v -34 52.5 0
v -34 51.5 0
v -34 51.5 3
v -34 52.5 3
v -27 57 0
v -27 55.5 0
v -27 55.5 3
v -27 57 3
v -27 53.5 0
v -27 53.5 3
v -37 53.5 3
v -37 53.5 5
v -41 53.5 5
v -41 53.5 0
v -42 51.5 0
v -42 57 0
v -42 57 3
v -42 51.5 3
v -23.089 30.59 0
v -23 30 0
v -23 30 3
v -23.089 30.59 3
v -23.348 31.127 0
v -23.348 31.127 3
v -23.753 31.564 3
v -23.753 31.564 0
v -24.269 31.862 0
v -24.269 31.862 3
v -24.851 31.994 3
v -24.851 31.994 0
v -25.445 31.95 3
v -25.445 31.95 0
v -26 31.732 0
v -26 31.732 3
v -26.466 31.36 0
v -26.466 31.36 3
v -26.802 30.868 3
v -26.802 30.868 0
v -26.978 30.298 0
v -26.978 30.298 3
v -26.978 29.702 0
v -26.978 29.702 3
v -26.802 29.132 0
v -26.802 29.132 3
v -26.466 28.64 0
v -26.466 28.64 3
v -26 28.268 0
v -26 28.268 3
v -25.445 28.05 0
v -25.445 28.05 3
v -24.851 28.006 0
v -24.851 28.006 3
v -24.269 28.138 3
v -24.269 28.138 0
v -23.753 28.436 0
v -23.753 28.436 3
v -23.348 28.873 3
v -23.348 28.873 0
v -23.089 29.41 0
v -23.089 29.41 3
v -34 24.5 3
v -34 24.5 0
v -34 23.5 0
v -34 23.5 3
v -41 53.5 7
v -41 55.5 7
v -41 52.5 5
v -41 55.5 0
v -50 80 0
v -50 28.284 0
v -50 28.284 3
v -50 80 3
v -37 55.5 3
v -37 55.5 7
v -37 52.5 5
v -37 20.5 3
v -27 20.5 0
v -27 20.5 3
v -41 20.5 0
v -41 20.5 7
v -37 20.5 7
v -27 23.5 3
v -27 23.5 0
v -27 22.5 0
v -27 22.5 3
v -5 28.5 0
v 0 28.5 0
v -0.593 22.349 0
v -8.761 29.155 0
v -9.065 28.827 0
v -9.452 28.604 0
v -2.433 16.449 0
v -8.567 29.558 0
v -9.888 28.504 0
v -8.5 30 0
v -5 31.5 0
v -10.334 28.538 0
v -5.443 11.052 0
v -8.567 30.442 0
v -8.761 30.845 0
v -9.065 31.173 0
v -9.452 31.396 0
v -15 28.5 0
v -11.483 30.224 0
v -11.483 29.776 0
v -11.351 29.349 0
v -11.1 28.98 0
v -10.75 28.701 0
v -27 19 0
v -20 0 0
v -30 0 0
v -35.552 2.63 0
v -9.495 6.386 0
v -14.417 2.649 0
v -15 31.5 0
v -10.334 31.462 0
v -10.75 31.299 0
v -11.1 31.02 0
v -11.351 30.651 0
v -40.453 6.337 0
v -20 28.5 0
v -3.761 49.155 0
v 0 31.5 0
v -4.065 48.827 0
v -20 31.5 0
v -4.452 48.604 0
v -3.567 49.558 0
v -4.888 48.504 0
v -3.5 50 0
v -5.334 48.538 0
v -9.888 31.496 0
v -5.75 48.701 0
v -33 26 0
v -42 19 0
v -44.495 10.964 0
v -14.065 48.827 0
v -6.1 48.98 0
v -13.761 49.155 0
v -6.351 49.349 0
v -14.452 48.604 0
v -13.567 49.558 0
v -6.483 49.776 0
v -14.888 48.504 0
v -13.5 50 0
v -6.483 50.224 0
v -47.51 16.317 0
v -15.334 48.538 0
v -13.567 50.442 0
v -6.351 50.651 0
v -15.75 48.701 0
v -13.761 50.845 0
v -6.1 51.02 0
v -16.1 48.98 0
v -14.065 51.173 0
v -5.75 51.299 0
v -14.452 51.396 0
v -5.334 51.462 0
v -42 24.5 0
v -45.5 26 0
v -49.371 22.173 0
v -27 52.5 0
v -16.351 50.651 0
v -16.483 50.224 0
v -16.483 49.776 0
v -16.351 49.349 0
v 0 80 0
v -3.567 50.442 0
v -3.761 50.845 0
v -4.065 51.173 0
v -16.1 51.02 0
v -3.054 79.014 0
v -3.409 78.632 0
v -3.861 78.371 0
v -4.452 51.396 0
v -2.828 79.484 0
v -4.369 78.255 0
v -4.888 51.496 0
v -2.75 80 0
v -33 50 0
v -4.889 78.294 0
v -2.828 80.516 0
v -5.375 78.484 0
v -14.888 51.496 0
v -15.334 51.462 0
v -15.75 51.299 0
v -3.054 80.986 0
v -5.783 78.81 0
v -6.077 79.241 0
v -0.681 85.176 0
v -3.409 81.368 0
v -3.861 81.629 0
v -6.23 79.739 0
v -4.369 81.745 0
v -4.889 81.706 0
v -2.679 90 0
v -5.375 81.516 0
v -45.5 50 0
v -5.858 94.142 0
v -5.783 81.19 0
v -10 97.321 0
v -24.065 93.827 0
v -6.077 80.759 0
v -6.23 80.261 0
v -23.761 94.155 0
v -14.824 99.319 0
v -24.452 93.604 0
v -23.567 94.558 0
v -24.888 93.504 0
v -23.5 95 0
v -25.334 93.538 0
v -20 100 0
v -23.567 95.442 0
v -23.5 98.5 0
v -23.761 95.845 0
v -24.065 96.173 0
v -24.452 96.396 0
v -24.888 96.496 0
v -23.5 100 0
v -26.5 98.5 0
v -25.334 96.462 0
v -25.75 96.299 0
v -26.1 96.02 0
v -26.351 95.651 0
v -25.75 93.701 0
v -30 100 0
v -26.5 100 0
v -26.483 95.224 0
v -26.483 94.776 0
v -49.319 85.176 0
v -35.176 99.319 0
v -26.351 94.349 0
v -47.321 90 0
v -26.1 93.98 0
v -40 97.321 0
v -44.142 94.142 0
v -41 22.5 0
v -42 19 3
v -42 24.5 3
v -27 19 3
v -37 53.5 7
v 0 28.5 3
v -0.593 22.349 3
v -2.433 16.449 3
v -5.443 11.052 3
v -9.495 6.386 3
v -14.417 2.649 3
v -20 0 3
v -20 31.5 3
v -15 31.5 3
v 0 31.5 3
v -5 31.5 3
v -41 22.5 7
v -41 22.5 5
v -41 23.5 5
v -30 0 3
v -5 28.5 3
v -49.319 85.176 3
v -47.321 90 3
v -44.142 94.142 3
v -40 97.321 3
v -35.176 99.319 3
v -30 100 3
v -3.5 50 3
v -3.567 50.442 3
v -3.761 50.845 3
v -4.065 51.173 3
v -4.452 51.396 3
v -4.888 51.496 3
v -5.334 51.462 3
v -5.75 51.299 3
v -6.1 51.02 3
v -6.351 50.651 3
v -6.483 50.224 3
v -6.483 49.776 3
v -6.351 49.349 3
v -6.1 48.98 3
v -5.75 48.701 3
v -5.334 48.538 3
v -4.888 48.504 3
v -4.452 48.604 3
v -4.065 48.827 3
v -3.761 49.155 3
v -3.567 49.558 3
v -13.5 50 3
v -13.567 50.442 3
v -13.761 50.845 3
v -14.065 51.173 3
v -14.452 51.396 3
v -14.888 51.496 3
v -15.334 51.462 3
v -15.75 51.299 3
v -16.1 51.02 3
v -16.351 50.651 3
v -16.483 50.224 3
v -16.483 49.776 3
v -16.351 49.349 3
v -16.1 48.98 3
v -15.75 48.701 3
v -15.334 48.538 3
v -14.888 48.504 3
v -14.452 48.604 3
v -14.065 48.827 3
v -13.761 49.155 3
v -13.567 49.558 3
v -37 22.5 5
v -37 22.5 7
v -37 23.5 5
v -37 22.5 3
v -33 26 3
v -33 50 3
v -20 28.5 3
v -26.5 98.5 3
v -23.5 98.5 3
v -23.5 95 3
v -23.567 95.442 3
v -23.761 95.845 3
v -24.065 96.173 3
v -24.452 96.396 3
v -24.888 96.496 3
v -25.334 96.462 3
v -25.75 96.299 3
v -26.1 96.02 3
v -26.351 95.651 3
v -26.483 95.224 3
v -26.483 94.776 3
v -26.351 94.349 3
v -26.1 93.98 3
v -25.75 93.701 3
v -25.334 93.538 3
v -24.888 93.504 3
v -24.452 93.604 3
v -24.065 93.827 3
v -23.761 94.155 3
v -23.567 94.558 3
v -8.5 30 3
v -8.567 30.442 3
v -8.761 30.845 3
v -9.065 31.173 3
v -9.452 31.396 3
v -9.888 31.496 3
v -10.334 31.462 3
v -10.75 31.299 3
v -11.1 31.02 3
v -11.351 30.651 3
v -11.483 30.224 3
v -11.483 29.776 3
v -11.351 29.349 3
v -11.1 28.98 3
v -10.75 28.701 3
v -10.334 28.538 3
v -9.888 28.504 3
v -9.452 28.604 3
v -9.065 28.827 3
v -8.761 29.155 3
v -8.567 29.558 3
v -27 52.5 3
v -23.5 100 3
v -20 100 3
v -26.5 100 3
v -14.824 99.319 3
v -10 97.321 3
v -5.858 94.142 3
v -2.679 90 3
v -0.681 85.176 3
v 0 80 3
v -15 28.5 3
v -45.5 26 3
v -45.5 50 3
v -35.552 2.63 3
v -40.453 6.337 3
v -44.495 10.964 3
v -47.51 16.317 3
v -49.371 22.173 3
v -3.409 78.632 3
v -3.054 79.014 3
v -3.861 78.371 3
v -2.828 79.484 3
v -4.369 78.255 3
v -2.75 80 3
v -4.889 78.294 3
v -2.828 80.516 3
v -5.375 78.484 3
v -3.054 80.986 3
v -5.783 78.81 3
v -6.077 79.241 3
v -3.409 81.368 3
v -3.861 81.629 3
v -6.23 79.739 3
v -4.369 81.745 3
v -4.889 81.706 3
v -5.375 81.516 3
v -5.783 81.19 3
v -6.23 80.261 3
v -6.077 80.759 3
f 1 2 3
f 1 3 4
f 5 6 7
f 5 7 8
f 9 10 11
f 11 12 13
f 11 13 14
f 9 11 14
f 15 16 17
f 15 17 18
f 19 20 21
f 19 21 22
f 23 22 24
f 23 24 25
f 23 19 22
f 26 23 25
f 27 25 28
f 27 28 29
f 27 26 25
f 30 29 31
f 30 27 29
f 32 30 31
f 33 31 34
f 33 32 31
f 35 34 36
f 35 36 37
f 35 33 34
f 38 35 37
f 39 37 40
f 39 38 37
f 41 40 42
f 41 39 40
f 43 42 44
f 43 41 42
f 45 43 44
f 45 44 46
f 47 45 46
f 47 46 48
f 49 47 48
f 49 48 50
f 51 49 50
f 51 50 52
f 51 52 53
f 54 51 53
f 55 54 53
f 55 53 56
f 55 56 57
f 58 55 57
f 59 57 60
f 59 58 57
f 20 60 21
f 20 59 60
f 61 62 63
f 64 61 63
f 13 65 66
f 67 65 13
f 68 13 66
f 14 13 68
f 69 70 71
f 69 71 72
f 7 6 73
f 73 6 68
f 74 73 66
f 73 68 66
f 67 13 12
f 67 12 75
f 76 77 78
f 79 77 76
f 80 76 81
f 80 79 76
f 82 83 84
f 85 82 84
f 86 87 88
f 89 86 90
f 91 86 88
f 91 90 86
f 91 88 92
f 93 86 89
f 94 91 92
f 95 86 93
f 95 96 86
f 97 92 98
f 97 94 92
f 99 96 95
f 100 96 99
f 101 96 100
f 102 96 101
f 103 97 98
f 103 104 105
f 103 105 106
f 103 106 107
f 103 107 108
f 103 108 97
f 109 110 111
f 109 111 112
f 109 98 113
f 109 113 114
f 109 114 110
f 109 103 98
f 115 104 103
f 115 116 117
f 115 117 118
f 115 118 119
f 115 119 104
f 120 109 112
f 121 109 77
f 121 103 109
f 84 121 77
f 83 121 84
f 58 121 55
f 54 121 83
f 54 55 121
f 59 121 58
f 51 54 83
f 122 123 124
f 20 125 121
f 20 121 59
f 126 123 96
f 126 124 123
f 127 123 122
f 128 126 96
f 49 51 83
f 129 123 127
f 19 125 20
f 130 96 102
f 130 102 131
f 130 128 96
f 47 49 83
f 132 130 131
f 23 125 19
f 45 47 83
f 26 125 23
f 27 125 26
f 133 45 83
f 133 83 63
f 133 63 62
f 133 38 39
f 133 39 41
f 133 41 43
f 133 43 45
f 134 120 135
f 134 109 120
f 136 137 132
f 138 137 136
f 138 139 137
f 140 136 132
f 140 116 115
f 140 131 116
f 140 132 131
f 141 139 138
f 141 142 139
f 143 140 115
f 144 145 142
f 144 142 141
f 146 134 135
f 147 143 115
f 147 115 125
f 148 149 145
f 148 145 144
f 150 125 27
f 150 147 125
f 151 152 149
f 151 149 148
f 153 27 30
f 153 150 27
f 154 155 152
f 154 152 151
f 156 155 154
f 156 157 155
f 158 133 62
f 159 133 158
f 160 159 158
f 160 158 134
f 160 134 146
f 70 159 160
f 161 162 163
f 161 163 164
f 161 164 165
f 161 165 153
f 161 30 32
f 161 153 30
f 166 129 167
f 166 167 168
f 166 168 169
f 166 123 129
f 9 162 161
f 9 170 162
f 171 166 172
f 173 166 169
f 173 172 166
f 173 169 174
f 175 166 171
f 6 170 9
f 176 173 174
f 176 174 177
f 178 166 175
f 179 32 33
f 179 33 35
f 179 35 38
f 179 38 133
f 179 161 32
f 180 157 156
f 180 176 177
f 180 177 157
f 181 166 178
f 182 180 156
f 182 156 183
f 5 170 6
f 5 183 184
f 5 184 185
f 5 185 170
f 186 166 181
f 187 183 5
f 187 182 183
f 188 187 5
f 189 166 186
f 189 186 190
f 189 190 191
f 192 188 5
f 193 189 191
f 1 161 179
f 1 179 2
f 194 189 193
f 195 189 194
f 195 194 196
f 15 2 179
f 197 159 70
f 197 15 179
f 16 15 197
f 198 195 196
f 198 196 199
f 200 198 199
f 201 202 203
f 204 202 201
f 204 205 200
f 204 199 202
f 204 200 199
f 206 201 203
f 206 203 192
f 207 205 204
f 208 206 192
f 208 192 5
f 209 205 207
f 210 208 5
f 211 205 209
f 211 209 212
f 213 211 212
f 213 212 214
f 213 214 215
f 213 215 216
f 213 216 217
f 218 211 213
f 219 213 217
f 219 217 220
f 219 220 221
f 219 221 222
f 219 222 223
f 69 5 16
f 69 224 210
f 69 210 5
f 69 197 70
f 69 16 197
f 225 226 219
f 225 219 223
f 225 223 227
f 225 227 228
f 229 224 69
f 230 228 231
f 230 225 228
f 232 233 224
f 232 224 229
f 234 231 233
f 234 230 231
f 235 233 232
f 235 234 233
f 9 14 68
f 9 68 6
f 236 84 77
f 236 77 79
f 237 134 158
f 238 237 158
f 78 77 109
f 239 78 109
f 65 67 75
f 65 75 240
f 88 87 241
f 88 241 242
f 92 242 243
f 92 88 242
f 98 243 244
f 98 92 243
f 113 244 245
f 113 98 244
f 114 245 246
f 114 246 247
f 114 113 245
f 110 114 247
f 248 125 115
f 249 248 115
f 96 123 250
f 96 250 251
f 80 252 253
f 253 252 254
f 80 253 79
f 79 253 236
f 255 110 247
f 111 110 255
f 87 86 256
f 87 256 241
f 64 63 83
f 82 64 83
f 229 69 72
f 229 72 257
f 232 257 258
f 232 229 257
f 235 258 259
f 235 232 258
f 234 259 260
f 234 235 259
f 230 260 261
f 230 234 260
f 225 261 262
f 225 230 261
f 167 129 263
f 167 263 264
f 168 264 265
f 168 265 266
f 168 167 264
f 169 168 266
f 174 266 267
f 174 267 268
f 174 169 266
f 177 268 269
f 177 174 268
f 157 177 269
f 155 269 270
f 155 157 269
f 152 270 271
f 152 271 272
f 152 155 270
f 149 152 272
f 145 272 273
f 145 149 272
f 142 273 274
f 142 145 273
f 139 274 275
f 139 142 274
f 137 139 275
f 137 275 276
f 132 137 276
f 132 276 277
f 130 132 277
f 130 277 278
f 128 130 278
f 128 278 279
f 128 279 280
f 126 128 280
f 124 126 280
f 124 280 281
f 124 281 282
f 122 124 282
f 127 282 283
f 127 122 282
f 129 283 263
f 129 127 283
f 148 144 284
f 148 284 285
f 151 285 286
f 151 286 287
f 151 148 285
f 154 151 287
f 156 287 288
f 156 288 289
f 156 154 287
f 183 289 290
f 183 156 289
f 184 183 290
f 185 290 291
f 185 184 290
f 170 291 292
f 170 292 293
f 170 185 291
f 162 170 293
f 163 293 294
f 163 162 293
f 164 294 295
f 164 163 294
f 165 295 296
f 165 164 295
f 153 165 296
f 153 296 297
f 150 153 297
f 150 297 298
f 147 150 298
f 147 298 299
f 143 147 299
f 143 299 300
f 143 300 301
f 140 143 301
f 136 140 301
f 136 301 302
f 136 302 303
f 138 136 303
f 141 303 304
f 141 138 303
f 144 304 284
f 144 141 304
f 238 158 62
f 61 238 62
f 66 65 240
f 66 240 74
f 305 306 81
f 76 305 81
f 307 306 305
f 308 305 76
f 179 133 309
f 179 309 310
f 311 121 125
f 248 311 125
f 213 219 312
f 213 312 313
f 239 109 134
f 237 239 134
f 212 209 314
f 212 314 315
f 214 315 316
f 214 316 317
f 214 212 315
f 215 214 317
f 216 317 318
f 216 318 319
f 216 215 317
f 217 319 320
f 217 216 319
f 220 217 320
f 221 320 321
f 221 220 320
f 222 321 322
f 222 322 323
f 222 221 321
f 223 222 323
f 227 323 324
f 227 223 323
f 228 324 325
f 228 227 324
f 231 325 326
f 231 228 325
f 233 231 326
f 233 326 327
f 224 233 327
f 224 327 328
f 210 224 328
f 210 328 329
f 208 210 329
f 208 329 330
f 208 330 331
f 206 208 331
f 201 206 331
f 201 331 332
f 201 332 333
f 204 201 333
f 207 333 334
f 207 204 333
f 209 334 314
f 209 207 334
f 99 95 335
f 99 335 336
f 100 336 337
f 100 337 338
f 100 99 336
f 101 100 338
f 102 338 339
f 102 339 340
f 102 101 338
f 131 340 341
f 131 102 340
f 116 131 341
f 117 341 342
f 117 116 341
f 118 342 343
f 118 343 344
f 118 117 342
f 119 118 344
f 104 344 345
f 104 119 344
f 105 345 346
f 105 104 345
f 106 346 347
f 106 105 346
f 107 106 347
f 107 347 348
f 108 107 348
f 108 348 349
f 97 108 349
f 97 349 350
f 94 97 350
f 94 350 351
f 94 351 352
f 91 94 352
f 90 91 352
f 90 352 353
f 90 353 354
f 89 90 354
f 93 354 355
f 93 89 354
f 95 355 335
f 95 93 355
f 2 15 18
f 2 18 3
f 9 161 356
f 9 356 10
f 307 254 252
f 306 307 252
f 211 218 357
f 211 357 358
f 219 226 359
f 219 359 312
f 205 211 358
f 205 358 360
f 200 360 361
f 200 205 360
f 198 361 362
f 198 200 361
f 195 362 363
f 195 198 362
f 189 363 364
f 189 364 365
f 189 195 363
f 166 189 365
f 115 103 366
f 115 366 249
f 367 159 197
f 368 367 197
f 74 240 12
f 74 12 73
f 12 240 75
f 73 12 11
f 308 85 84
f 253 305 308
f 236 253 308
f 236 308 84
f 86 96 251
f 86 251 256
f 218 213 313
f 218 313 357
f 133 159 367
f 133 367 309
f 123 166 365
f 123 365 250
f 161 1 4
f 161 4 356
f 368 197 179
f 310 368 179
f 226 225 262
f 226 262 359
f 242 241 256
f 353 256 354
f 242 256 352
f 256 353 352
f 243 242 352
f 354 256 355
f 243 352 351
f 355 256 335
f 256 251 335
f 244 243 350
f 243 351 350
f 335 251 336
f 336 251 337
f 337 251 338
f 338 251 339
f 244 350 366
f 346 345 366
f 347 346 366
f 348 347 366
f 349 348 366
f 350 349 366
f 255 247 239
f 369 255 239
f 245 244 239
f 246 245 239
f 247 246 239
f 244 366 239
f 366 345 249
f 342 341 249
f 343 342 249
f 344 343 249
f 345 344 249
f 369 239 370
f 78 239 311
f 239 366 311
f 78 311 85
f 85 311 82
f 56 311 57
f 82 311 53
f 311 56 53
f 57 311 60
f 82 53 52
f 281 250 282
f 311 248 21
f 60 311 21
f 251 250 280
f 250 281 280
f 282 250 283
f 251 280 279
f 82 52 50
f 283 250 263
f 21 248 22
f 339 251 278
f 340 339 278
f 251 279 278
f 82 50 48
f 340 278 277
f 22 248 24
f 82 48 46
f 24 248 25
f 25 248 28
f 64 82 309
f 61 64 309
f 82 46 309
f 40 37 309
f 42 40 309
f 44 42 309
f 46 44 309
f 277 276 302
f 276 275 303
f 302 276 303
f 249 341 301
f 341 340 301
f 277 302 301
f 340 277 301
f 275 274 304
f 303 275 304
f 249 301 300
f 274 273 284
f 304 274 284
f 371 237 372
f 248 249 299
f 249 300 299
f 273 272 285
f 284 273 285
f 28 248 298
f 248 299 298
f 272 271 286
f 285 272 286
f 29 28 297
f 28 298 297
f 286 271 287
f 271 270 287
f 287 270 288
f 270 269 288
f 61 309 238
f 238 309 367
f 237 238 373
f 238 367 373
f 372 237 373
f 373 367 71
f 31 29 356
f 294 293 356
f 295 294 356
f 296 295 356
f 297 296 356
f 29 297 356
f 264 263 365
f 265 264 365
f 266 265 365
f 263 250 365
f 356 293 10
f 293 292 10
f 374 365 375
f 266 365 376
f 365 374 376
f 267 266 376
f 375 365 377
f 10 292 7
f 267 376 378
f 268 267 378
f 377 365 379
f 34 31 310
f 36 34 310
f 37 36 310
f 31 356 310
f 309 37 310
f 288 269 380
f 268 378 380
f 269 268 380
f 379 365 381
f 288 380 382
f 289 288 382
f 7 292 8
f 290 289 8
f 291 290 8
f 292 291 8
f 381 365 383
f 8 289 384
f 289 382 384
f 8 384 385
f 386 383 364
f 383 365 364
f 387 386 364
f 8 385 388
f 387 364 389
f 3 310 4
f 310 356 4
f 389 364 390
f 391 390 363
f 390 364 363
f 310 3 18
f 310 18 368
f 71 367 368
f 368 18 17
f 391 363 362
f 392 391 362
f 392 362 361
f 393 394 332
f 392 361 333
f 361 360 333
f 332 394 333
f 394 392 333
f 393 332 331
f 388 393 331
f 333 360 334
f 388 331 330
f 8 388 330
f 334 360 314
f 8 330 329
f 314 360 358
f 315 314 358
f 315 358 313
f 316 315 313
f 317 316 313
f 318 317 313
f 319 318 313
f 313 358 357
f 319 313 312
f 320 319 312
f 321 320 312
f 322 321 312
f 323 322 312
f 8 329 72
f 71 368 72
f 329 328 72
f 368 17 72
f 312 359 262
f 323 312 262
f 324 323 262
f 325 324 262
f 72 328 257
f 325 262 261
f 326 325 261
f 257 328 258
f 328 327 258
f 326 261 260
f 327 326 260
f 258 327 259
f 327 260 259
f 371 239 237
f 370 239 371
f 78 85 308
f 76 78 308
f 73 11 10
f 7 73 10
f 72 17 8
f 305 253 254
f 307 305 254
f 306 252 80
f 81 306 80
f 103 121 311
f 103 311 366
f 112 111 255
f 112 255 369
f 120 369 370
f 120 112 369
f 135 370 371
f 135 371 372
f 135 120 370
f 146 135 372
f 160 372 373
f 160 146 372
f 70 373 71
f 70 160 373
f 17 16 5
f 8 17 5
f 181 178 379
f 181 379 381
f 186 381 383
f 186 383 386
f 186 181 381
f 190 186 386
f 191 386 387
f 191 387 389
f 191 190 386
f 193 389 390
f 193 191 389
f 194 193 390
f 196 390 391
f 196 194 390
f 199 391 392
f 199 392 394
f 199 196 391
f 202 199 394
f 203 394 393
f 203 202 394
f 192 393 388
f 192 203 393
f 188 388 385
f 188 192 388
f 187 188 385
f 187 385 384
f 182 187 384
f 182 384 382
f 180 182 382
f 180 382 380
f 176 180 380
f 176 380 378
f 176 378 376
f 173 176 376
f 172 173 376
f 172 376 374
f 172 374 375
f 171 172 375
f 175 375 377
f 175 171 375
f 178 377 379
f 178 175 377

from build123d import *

# Parameters (mm, degrees)
ESQUISSE1_W        = 12.5
ESQUISSE1_H        = 24
ESQUISSE1_R        = 2
ESQUISSE1_W_2      = 5
ESQUISSE1_H_2      = 3
ESQUISSE1_R_2      = 1.5
ESQUISSE1_R_3      = 1.75
BOSS_EXTRU_1_DEPTH = 3
BOSS_EXTRU_2_DEPTH = 4


with BuildPart() as part:
    # Esquisse1 → Boss.-Extru.1 (new body)
    with BuildSketch(Plane.XY):
        with BuildLine():
            Line((-30, 0), (-20, 0))
            ThreePointArc((-20, 0), (-5.505102572, 10.963763172), (0, 28.284271247))
            ThreePointArc((0, 28.284271247), (-0.000193915, 28.392136321), (-0.000775658, 28.5))
            Line((-0.000775658, 28.5), (-5, 28.5))
            Line((-5, 28.5), (-5, 31.5))
            Line((-5, 31.5), (0, 31.5))
            Line((0, 31.5), (0, 80))
            ThreePointArc((0, 80), (-5.857864376, 94.142135624), (-20, 100))
            Line((-20, 100), (-23.5, 100))
            Line((-23.5, 100), (-23.5, 98.5))
            Line((-23.5, 98.5), (-26.5, 98.5))
            Line((-26.5, 98.5), (-26.5, 100))
            Line((-26.5, 100), (-30, 100))
            ThreePointArc((-30, 100), (-44.142135624, 94.142135624), (-50, 80))
            Line((-50, 80), (-50, 28.284271247))
            ThreePointArc((-50, 28.284271247), (-44.494897428, 10.963763172), (-30, 0))
        make_face()
        Polygon((-42, 19), (-42, 24.5), (-34, 24.5), (-34, 23.5), (-27, 23.5), (-27, 22.5), (-41, 22.5), (-41, 20.5), (-27, 20.5), (-27, 19), (-35, 19), align=None, mode=Mode.SUBTRACT)
        with Locations((-39.25, 38)):
            Rectangle(ESQUISSE1_W, ESQUISSE1_H, mode=Mode.SUBTRACT)
        with Locations((-25, 30)):
            Circle(ESQUISSE1_R, mode=Mode.SUBTRACT)
        with Locations((-17.5, 30)):
            Rectangle(ESQUISSE1_W_2, ESQUISSE1_H_2, mode=Mode.SUBTRACT)
        with Locations((-10, 30)):
            Circle(ESQUISSE1_R_2, mode=Mode.SUBTRACT)
        Polygon((-34, 52.5), (-34, 51.5), (-42, 51.5), (-42, 57), (-35, 57), (-27, 57), (-27, 55.5), (-41, 55.5), (-41, 53.5), (-27, 53.5), (-27, 52.5), align=None, mode=Mode.SUBTRACT)
        with Locations((-15, 50)):
            Circle(ESQUISSE1_R_2, mode=Mode.SUBTRACT)
        with Locations((-5, 50)):
            Circle(ESQUISSE1_R_2, mode=Mode.SUBTRACT)
        with Locations((-25, 95)):
            Circle(ESQUISSE1_R_2, mode=Mode.SUBTRACT)
        with Locations((-4.5, 80)):
            Circle(ESQUISSE1_R_3, mode=Mode.SUBTRACT)
    extrude(amount=BOSS_EXTRU_1_DEPTH)

    # Esquisse2 → Boss.-Extru.2 (add)
    with BuildSketch(Plane.ZY.offset(41)):
        Polygon((3, 22.5), (5, 22.5), (5, 23.5), (7, 22.5), (7, 20.5), (3, 20.5), (0, 20.5), (0, 22.5), align=None)
    boss_extru_2 = extrude(amount=-BOSS_EXTRU_2_DEPTH)

    # Symétrie1: Boss.-Extru.2 across plane
    add(boss_extru_2.mirror(Plane.ZX.offset(38)))


solid = part.part
